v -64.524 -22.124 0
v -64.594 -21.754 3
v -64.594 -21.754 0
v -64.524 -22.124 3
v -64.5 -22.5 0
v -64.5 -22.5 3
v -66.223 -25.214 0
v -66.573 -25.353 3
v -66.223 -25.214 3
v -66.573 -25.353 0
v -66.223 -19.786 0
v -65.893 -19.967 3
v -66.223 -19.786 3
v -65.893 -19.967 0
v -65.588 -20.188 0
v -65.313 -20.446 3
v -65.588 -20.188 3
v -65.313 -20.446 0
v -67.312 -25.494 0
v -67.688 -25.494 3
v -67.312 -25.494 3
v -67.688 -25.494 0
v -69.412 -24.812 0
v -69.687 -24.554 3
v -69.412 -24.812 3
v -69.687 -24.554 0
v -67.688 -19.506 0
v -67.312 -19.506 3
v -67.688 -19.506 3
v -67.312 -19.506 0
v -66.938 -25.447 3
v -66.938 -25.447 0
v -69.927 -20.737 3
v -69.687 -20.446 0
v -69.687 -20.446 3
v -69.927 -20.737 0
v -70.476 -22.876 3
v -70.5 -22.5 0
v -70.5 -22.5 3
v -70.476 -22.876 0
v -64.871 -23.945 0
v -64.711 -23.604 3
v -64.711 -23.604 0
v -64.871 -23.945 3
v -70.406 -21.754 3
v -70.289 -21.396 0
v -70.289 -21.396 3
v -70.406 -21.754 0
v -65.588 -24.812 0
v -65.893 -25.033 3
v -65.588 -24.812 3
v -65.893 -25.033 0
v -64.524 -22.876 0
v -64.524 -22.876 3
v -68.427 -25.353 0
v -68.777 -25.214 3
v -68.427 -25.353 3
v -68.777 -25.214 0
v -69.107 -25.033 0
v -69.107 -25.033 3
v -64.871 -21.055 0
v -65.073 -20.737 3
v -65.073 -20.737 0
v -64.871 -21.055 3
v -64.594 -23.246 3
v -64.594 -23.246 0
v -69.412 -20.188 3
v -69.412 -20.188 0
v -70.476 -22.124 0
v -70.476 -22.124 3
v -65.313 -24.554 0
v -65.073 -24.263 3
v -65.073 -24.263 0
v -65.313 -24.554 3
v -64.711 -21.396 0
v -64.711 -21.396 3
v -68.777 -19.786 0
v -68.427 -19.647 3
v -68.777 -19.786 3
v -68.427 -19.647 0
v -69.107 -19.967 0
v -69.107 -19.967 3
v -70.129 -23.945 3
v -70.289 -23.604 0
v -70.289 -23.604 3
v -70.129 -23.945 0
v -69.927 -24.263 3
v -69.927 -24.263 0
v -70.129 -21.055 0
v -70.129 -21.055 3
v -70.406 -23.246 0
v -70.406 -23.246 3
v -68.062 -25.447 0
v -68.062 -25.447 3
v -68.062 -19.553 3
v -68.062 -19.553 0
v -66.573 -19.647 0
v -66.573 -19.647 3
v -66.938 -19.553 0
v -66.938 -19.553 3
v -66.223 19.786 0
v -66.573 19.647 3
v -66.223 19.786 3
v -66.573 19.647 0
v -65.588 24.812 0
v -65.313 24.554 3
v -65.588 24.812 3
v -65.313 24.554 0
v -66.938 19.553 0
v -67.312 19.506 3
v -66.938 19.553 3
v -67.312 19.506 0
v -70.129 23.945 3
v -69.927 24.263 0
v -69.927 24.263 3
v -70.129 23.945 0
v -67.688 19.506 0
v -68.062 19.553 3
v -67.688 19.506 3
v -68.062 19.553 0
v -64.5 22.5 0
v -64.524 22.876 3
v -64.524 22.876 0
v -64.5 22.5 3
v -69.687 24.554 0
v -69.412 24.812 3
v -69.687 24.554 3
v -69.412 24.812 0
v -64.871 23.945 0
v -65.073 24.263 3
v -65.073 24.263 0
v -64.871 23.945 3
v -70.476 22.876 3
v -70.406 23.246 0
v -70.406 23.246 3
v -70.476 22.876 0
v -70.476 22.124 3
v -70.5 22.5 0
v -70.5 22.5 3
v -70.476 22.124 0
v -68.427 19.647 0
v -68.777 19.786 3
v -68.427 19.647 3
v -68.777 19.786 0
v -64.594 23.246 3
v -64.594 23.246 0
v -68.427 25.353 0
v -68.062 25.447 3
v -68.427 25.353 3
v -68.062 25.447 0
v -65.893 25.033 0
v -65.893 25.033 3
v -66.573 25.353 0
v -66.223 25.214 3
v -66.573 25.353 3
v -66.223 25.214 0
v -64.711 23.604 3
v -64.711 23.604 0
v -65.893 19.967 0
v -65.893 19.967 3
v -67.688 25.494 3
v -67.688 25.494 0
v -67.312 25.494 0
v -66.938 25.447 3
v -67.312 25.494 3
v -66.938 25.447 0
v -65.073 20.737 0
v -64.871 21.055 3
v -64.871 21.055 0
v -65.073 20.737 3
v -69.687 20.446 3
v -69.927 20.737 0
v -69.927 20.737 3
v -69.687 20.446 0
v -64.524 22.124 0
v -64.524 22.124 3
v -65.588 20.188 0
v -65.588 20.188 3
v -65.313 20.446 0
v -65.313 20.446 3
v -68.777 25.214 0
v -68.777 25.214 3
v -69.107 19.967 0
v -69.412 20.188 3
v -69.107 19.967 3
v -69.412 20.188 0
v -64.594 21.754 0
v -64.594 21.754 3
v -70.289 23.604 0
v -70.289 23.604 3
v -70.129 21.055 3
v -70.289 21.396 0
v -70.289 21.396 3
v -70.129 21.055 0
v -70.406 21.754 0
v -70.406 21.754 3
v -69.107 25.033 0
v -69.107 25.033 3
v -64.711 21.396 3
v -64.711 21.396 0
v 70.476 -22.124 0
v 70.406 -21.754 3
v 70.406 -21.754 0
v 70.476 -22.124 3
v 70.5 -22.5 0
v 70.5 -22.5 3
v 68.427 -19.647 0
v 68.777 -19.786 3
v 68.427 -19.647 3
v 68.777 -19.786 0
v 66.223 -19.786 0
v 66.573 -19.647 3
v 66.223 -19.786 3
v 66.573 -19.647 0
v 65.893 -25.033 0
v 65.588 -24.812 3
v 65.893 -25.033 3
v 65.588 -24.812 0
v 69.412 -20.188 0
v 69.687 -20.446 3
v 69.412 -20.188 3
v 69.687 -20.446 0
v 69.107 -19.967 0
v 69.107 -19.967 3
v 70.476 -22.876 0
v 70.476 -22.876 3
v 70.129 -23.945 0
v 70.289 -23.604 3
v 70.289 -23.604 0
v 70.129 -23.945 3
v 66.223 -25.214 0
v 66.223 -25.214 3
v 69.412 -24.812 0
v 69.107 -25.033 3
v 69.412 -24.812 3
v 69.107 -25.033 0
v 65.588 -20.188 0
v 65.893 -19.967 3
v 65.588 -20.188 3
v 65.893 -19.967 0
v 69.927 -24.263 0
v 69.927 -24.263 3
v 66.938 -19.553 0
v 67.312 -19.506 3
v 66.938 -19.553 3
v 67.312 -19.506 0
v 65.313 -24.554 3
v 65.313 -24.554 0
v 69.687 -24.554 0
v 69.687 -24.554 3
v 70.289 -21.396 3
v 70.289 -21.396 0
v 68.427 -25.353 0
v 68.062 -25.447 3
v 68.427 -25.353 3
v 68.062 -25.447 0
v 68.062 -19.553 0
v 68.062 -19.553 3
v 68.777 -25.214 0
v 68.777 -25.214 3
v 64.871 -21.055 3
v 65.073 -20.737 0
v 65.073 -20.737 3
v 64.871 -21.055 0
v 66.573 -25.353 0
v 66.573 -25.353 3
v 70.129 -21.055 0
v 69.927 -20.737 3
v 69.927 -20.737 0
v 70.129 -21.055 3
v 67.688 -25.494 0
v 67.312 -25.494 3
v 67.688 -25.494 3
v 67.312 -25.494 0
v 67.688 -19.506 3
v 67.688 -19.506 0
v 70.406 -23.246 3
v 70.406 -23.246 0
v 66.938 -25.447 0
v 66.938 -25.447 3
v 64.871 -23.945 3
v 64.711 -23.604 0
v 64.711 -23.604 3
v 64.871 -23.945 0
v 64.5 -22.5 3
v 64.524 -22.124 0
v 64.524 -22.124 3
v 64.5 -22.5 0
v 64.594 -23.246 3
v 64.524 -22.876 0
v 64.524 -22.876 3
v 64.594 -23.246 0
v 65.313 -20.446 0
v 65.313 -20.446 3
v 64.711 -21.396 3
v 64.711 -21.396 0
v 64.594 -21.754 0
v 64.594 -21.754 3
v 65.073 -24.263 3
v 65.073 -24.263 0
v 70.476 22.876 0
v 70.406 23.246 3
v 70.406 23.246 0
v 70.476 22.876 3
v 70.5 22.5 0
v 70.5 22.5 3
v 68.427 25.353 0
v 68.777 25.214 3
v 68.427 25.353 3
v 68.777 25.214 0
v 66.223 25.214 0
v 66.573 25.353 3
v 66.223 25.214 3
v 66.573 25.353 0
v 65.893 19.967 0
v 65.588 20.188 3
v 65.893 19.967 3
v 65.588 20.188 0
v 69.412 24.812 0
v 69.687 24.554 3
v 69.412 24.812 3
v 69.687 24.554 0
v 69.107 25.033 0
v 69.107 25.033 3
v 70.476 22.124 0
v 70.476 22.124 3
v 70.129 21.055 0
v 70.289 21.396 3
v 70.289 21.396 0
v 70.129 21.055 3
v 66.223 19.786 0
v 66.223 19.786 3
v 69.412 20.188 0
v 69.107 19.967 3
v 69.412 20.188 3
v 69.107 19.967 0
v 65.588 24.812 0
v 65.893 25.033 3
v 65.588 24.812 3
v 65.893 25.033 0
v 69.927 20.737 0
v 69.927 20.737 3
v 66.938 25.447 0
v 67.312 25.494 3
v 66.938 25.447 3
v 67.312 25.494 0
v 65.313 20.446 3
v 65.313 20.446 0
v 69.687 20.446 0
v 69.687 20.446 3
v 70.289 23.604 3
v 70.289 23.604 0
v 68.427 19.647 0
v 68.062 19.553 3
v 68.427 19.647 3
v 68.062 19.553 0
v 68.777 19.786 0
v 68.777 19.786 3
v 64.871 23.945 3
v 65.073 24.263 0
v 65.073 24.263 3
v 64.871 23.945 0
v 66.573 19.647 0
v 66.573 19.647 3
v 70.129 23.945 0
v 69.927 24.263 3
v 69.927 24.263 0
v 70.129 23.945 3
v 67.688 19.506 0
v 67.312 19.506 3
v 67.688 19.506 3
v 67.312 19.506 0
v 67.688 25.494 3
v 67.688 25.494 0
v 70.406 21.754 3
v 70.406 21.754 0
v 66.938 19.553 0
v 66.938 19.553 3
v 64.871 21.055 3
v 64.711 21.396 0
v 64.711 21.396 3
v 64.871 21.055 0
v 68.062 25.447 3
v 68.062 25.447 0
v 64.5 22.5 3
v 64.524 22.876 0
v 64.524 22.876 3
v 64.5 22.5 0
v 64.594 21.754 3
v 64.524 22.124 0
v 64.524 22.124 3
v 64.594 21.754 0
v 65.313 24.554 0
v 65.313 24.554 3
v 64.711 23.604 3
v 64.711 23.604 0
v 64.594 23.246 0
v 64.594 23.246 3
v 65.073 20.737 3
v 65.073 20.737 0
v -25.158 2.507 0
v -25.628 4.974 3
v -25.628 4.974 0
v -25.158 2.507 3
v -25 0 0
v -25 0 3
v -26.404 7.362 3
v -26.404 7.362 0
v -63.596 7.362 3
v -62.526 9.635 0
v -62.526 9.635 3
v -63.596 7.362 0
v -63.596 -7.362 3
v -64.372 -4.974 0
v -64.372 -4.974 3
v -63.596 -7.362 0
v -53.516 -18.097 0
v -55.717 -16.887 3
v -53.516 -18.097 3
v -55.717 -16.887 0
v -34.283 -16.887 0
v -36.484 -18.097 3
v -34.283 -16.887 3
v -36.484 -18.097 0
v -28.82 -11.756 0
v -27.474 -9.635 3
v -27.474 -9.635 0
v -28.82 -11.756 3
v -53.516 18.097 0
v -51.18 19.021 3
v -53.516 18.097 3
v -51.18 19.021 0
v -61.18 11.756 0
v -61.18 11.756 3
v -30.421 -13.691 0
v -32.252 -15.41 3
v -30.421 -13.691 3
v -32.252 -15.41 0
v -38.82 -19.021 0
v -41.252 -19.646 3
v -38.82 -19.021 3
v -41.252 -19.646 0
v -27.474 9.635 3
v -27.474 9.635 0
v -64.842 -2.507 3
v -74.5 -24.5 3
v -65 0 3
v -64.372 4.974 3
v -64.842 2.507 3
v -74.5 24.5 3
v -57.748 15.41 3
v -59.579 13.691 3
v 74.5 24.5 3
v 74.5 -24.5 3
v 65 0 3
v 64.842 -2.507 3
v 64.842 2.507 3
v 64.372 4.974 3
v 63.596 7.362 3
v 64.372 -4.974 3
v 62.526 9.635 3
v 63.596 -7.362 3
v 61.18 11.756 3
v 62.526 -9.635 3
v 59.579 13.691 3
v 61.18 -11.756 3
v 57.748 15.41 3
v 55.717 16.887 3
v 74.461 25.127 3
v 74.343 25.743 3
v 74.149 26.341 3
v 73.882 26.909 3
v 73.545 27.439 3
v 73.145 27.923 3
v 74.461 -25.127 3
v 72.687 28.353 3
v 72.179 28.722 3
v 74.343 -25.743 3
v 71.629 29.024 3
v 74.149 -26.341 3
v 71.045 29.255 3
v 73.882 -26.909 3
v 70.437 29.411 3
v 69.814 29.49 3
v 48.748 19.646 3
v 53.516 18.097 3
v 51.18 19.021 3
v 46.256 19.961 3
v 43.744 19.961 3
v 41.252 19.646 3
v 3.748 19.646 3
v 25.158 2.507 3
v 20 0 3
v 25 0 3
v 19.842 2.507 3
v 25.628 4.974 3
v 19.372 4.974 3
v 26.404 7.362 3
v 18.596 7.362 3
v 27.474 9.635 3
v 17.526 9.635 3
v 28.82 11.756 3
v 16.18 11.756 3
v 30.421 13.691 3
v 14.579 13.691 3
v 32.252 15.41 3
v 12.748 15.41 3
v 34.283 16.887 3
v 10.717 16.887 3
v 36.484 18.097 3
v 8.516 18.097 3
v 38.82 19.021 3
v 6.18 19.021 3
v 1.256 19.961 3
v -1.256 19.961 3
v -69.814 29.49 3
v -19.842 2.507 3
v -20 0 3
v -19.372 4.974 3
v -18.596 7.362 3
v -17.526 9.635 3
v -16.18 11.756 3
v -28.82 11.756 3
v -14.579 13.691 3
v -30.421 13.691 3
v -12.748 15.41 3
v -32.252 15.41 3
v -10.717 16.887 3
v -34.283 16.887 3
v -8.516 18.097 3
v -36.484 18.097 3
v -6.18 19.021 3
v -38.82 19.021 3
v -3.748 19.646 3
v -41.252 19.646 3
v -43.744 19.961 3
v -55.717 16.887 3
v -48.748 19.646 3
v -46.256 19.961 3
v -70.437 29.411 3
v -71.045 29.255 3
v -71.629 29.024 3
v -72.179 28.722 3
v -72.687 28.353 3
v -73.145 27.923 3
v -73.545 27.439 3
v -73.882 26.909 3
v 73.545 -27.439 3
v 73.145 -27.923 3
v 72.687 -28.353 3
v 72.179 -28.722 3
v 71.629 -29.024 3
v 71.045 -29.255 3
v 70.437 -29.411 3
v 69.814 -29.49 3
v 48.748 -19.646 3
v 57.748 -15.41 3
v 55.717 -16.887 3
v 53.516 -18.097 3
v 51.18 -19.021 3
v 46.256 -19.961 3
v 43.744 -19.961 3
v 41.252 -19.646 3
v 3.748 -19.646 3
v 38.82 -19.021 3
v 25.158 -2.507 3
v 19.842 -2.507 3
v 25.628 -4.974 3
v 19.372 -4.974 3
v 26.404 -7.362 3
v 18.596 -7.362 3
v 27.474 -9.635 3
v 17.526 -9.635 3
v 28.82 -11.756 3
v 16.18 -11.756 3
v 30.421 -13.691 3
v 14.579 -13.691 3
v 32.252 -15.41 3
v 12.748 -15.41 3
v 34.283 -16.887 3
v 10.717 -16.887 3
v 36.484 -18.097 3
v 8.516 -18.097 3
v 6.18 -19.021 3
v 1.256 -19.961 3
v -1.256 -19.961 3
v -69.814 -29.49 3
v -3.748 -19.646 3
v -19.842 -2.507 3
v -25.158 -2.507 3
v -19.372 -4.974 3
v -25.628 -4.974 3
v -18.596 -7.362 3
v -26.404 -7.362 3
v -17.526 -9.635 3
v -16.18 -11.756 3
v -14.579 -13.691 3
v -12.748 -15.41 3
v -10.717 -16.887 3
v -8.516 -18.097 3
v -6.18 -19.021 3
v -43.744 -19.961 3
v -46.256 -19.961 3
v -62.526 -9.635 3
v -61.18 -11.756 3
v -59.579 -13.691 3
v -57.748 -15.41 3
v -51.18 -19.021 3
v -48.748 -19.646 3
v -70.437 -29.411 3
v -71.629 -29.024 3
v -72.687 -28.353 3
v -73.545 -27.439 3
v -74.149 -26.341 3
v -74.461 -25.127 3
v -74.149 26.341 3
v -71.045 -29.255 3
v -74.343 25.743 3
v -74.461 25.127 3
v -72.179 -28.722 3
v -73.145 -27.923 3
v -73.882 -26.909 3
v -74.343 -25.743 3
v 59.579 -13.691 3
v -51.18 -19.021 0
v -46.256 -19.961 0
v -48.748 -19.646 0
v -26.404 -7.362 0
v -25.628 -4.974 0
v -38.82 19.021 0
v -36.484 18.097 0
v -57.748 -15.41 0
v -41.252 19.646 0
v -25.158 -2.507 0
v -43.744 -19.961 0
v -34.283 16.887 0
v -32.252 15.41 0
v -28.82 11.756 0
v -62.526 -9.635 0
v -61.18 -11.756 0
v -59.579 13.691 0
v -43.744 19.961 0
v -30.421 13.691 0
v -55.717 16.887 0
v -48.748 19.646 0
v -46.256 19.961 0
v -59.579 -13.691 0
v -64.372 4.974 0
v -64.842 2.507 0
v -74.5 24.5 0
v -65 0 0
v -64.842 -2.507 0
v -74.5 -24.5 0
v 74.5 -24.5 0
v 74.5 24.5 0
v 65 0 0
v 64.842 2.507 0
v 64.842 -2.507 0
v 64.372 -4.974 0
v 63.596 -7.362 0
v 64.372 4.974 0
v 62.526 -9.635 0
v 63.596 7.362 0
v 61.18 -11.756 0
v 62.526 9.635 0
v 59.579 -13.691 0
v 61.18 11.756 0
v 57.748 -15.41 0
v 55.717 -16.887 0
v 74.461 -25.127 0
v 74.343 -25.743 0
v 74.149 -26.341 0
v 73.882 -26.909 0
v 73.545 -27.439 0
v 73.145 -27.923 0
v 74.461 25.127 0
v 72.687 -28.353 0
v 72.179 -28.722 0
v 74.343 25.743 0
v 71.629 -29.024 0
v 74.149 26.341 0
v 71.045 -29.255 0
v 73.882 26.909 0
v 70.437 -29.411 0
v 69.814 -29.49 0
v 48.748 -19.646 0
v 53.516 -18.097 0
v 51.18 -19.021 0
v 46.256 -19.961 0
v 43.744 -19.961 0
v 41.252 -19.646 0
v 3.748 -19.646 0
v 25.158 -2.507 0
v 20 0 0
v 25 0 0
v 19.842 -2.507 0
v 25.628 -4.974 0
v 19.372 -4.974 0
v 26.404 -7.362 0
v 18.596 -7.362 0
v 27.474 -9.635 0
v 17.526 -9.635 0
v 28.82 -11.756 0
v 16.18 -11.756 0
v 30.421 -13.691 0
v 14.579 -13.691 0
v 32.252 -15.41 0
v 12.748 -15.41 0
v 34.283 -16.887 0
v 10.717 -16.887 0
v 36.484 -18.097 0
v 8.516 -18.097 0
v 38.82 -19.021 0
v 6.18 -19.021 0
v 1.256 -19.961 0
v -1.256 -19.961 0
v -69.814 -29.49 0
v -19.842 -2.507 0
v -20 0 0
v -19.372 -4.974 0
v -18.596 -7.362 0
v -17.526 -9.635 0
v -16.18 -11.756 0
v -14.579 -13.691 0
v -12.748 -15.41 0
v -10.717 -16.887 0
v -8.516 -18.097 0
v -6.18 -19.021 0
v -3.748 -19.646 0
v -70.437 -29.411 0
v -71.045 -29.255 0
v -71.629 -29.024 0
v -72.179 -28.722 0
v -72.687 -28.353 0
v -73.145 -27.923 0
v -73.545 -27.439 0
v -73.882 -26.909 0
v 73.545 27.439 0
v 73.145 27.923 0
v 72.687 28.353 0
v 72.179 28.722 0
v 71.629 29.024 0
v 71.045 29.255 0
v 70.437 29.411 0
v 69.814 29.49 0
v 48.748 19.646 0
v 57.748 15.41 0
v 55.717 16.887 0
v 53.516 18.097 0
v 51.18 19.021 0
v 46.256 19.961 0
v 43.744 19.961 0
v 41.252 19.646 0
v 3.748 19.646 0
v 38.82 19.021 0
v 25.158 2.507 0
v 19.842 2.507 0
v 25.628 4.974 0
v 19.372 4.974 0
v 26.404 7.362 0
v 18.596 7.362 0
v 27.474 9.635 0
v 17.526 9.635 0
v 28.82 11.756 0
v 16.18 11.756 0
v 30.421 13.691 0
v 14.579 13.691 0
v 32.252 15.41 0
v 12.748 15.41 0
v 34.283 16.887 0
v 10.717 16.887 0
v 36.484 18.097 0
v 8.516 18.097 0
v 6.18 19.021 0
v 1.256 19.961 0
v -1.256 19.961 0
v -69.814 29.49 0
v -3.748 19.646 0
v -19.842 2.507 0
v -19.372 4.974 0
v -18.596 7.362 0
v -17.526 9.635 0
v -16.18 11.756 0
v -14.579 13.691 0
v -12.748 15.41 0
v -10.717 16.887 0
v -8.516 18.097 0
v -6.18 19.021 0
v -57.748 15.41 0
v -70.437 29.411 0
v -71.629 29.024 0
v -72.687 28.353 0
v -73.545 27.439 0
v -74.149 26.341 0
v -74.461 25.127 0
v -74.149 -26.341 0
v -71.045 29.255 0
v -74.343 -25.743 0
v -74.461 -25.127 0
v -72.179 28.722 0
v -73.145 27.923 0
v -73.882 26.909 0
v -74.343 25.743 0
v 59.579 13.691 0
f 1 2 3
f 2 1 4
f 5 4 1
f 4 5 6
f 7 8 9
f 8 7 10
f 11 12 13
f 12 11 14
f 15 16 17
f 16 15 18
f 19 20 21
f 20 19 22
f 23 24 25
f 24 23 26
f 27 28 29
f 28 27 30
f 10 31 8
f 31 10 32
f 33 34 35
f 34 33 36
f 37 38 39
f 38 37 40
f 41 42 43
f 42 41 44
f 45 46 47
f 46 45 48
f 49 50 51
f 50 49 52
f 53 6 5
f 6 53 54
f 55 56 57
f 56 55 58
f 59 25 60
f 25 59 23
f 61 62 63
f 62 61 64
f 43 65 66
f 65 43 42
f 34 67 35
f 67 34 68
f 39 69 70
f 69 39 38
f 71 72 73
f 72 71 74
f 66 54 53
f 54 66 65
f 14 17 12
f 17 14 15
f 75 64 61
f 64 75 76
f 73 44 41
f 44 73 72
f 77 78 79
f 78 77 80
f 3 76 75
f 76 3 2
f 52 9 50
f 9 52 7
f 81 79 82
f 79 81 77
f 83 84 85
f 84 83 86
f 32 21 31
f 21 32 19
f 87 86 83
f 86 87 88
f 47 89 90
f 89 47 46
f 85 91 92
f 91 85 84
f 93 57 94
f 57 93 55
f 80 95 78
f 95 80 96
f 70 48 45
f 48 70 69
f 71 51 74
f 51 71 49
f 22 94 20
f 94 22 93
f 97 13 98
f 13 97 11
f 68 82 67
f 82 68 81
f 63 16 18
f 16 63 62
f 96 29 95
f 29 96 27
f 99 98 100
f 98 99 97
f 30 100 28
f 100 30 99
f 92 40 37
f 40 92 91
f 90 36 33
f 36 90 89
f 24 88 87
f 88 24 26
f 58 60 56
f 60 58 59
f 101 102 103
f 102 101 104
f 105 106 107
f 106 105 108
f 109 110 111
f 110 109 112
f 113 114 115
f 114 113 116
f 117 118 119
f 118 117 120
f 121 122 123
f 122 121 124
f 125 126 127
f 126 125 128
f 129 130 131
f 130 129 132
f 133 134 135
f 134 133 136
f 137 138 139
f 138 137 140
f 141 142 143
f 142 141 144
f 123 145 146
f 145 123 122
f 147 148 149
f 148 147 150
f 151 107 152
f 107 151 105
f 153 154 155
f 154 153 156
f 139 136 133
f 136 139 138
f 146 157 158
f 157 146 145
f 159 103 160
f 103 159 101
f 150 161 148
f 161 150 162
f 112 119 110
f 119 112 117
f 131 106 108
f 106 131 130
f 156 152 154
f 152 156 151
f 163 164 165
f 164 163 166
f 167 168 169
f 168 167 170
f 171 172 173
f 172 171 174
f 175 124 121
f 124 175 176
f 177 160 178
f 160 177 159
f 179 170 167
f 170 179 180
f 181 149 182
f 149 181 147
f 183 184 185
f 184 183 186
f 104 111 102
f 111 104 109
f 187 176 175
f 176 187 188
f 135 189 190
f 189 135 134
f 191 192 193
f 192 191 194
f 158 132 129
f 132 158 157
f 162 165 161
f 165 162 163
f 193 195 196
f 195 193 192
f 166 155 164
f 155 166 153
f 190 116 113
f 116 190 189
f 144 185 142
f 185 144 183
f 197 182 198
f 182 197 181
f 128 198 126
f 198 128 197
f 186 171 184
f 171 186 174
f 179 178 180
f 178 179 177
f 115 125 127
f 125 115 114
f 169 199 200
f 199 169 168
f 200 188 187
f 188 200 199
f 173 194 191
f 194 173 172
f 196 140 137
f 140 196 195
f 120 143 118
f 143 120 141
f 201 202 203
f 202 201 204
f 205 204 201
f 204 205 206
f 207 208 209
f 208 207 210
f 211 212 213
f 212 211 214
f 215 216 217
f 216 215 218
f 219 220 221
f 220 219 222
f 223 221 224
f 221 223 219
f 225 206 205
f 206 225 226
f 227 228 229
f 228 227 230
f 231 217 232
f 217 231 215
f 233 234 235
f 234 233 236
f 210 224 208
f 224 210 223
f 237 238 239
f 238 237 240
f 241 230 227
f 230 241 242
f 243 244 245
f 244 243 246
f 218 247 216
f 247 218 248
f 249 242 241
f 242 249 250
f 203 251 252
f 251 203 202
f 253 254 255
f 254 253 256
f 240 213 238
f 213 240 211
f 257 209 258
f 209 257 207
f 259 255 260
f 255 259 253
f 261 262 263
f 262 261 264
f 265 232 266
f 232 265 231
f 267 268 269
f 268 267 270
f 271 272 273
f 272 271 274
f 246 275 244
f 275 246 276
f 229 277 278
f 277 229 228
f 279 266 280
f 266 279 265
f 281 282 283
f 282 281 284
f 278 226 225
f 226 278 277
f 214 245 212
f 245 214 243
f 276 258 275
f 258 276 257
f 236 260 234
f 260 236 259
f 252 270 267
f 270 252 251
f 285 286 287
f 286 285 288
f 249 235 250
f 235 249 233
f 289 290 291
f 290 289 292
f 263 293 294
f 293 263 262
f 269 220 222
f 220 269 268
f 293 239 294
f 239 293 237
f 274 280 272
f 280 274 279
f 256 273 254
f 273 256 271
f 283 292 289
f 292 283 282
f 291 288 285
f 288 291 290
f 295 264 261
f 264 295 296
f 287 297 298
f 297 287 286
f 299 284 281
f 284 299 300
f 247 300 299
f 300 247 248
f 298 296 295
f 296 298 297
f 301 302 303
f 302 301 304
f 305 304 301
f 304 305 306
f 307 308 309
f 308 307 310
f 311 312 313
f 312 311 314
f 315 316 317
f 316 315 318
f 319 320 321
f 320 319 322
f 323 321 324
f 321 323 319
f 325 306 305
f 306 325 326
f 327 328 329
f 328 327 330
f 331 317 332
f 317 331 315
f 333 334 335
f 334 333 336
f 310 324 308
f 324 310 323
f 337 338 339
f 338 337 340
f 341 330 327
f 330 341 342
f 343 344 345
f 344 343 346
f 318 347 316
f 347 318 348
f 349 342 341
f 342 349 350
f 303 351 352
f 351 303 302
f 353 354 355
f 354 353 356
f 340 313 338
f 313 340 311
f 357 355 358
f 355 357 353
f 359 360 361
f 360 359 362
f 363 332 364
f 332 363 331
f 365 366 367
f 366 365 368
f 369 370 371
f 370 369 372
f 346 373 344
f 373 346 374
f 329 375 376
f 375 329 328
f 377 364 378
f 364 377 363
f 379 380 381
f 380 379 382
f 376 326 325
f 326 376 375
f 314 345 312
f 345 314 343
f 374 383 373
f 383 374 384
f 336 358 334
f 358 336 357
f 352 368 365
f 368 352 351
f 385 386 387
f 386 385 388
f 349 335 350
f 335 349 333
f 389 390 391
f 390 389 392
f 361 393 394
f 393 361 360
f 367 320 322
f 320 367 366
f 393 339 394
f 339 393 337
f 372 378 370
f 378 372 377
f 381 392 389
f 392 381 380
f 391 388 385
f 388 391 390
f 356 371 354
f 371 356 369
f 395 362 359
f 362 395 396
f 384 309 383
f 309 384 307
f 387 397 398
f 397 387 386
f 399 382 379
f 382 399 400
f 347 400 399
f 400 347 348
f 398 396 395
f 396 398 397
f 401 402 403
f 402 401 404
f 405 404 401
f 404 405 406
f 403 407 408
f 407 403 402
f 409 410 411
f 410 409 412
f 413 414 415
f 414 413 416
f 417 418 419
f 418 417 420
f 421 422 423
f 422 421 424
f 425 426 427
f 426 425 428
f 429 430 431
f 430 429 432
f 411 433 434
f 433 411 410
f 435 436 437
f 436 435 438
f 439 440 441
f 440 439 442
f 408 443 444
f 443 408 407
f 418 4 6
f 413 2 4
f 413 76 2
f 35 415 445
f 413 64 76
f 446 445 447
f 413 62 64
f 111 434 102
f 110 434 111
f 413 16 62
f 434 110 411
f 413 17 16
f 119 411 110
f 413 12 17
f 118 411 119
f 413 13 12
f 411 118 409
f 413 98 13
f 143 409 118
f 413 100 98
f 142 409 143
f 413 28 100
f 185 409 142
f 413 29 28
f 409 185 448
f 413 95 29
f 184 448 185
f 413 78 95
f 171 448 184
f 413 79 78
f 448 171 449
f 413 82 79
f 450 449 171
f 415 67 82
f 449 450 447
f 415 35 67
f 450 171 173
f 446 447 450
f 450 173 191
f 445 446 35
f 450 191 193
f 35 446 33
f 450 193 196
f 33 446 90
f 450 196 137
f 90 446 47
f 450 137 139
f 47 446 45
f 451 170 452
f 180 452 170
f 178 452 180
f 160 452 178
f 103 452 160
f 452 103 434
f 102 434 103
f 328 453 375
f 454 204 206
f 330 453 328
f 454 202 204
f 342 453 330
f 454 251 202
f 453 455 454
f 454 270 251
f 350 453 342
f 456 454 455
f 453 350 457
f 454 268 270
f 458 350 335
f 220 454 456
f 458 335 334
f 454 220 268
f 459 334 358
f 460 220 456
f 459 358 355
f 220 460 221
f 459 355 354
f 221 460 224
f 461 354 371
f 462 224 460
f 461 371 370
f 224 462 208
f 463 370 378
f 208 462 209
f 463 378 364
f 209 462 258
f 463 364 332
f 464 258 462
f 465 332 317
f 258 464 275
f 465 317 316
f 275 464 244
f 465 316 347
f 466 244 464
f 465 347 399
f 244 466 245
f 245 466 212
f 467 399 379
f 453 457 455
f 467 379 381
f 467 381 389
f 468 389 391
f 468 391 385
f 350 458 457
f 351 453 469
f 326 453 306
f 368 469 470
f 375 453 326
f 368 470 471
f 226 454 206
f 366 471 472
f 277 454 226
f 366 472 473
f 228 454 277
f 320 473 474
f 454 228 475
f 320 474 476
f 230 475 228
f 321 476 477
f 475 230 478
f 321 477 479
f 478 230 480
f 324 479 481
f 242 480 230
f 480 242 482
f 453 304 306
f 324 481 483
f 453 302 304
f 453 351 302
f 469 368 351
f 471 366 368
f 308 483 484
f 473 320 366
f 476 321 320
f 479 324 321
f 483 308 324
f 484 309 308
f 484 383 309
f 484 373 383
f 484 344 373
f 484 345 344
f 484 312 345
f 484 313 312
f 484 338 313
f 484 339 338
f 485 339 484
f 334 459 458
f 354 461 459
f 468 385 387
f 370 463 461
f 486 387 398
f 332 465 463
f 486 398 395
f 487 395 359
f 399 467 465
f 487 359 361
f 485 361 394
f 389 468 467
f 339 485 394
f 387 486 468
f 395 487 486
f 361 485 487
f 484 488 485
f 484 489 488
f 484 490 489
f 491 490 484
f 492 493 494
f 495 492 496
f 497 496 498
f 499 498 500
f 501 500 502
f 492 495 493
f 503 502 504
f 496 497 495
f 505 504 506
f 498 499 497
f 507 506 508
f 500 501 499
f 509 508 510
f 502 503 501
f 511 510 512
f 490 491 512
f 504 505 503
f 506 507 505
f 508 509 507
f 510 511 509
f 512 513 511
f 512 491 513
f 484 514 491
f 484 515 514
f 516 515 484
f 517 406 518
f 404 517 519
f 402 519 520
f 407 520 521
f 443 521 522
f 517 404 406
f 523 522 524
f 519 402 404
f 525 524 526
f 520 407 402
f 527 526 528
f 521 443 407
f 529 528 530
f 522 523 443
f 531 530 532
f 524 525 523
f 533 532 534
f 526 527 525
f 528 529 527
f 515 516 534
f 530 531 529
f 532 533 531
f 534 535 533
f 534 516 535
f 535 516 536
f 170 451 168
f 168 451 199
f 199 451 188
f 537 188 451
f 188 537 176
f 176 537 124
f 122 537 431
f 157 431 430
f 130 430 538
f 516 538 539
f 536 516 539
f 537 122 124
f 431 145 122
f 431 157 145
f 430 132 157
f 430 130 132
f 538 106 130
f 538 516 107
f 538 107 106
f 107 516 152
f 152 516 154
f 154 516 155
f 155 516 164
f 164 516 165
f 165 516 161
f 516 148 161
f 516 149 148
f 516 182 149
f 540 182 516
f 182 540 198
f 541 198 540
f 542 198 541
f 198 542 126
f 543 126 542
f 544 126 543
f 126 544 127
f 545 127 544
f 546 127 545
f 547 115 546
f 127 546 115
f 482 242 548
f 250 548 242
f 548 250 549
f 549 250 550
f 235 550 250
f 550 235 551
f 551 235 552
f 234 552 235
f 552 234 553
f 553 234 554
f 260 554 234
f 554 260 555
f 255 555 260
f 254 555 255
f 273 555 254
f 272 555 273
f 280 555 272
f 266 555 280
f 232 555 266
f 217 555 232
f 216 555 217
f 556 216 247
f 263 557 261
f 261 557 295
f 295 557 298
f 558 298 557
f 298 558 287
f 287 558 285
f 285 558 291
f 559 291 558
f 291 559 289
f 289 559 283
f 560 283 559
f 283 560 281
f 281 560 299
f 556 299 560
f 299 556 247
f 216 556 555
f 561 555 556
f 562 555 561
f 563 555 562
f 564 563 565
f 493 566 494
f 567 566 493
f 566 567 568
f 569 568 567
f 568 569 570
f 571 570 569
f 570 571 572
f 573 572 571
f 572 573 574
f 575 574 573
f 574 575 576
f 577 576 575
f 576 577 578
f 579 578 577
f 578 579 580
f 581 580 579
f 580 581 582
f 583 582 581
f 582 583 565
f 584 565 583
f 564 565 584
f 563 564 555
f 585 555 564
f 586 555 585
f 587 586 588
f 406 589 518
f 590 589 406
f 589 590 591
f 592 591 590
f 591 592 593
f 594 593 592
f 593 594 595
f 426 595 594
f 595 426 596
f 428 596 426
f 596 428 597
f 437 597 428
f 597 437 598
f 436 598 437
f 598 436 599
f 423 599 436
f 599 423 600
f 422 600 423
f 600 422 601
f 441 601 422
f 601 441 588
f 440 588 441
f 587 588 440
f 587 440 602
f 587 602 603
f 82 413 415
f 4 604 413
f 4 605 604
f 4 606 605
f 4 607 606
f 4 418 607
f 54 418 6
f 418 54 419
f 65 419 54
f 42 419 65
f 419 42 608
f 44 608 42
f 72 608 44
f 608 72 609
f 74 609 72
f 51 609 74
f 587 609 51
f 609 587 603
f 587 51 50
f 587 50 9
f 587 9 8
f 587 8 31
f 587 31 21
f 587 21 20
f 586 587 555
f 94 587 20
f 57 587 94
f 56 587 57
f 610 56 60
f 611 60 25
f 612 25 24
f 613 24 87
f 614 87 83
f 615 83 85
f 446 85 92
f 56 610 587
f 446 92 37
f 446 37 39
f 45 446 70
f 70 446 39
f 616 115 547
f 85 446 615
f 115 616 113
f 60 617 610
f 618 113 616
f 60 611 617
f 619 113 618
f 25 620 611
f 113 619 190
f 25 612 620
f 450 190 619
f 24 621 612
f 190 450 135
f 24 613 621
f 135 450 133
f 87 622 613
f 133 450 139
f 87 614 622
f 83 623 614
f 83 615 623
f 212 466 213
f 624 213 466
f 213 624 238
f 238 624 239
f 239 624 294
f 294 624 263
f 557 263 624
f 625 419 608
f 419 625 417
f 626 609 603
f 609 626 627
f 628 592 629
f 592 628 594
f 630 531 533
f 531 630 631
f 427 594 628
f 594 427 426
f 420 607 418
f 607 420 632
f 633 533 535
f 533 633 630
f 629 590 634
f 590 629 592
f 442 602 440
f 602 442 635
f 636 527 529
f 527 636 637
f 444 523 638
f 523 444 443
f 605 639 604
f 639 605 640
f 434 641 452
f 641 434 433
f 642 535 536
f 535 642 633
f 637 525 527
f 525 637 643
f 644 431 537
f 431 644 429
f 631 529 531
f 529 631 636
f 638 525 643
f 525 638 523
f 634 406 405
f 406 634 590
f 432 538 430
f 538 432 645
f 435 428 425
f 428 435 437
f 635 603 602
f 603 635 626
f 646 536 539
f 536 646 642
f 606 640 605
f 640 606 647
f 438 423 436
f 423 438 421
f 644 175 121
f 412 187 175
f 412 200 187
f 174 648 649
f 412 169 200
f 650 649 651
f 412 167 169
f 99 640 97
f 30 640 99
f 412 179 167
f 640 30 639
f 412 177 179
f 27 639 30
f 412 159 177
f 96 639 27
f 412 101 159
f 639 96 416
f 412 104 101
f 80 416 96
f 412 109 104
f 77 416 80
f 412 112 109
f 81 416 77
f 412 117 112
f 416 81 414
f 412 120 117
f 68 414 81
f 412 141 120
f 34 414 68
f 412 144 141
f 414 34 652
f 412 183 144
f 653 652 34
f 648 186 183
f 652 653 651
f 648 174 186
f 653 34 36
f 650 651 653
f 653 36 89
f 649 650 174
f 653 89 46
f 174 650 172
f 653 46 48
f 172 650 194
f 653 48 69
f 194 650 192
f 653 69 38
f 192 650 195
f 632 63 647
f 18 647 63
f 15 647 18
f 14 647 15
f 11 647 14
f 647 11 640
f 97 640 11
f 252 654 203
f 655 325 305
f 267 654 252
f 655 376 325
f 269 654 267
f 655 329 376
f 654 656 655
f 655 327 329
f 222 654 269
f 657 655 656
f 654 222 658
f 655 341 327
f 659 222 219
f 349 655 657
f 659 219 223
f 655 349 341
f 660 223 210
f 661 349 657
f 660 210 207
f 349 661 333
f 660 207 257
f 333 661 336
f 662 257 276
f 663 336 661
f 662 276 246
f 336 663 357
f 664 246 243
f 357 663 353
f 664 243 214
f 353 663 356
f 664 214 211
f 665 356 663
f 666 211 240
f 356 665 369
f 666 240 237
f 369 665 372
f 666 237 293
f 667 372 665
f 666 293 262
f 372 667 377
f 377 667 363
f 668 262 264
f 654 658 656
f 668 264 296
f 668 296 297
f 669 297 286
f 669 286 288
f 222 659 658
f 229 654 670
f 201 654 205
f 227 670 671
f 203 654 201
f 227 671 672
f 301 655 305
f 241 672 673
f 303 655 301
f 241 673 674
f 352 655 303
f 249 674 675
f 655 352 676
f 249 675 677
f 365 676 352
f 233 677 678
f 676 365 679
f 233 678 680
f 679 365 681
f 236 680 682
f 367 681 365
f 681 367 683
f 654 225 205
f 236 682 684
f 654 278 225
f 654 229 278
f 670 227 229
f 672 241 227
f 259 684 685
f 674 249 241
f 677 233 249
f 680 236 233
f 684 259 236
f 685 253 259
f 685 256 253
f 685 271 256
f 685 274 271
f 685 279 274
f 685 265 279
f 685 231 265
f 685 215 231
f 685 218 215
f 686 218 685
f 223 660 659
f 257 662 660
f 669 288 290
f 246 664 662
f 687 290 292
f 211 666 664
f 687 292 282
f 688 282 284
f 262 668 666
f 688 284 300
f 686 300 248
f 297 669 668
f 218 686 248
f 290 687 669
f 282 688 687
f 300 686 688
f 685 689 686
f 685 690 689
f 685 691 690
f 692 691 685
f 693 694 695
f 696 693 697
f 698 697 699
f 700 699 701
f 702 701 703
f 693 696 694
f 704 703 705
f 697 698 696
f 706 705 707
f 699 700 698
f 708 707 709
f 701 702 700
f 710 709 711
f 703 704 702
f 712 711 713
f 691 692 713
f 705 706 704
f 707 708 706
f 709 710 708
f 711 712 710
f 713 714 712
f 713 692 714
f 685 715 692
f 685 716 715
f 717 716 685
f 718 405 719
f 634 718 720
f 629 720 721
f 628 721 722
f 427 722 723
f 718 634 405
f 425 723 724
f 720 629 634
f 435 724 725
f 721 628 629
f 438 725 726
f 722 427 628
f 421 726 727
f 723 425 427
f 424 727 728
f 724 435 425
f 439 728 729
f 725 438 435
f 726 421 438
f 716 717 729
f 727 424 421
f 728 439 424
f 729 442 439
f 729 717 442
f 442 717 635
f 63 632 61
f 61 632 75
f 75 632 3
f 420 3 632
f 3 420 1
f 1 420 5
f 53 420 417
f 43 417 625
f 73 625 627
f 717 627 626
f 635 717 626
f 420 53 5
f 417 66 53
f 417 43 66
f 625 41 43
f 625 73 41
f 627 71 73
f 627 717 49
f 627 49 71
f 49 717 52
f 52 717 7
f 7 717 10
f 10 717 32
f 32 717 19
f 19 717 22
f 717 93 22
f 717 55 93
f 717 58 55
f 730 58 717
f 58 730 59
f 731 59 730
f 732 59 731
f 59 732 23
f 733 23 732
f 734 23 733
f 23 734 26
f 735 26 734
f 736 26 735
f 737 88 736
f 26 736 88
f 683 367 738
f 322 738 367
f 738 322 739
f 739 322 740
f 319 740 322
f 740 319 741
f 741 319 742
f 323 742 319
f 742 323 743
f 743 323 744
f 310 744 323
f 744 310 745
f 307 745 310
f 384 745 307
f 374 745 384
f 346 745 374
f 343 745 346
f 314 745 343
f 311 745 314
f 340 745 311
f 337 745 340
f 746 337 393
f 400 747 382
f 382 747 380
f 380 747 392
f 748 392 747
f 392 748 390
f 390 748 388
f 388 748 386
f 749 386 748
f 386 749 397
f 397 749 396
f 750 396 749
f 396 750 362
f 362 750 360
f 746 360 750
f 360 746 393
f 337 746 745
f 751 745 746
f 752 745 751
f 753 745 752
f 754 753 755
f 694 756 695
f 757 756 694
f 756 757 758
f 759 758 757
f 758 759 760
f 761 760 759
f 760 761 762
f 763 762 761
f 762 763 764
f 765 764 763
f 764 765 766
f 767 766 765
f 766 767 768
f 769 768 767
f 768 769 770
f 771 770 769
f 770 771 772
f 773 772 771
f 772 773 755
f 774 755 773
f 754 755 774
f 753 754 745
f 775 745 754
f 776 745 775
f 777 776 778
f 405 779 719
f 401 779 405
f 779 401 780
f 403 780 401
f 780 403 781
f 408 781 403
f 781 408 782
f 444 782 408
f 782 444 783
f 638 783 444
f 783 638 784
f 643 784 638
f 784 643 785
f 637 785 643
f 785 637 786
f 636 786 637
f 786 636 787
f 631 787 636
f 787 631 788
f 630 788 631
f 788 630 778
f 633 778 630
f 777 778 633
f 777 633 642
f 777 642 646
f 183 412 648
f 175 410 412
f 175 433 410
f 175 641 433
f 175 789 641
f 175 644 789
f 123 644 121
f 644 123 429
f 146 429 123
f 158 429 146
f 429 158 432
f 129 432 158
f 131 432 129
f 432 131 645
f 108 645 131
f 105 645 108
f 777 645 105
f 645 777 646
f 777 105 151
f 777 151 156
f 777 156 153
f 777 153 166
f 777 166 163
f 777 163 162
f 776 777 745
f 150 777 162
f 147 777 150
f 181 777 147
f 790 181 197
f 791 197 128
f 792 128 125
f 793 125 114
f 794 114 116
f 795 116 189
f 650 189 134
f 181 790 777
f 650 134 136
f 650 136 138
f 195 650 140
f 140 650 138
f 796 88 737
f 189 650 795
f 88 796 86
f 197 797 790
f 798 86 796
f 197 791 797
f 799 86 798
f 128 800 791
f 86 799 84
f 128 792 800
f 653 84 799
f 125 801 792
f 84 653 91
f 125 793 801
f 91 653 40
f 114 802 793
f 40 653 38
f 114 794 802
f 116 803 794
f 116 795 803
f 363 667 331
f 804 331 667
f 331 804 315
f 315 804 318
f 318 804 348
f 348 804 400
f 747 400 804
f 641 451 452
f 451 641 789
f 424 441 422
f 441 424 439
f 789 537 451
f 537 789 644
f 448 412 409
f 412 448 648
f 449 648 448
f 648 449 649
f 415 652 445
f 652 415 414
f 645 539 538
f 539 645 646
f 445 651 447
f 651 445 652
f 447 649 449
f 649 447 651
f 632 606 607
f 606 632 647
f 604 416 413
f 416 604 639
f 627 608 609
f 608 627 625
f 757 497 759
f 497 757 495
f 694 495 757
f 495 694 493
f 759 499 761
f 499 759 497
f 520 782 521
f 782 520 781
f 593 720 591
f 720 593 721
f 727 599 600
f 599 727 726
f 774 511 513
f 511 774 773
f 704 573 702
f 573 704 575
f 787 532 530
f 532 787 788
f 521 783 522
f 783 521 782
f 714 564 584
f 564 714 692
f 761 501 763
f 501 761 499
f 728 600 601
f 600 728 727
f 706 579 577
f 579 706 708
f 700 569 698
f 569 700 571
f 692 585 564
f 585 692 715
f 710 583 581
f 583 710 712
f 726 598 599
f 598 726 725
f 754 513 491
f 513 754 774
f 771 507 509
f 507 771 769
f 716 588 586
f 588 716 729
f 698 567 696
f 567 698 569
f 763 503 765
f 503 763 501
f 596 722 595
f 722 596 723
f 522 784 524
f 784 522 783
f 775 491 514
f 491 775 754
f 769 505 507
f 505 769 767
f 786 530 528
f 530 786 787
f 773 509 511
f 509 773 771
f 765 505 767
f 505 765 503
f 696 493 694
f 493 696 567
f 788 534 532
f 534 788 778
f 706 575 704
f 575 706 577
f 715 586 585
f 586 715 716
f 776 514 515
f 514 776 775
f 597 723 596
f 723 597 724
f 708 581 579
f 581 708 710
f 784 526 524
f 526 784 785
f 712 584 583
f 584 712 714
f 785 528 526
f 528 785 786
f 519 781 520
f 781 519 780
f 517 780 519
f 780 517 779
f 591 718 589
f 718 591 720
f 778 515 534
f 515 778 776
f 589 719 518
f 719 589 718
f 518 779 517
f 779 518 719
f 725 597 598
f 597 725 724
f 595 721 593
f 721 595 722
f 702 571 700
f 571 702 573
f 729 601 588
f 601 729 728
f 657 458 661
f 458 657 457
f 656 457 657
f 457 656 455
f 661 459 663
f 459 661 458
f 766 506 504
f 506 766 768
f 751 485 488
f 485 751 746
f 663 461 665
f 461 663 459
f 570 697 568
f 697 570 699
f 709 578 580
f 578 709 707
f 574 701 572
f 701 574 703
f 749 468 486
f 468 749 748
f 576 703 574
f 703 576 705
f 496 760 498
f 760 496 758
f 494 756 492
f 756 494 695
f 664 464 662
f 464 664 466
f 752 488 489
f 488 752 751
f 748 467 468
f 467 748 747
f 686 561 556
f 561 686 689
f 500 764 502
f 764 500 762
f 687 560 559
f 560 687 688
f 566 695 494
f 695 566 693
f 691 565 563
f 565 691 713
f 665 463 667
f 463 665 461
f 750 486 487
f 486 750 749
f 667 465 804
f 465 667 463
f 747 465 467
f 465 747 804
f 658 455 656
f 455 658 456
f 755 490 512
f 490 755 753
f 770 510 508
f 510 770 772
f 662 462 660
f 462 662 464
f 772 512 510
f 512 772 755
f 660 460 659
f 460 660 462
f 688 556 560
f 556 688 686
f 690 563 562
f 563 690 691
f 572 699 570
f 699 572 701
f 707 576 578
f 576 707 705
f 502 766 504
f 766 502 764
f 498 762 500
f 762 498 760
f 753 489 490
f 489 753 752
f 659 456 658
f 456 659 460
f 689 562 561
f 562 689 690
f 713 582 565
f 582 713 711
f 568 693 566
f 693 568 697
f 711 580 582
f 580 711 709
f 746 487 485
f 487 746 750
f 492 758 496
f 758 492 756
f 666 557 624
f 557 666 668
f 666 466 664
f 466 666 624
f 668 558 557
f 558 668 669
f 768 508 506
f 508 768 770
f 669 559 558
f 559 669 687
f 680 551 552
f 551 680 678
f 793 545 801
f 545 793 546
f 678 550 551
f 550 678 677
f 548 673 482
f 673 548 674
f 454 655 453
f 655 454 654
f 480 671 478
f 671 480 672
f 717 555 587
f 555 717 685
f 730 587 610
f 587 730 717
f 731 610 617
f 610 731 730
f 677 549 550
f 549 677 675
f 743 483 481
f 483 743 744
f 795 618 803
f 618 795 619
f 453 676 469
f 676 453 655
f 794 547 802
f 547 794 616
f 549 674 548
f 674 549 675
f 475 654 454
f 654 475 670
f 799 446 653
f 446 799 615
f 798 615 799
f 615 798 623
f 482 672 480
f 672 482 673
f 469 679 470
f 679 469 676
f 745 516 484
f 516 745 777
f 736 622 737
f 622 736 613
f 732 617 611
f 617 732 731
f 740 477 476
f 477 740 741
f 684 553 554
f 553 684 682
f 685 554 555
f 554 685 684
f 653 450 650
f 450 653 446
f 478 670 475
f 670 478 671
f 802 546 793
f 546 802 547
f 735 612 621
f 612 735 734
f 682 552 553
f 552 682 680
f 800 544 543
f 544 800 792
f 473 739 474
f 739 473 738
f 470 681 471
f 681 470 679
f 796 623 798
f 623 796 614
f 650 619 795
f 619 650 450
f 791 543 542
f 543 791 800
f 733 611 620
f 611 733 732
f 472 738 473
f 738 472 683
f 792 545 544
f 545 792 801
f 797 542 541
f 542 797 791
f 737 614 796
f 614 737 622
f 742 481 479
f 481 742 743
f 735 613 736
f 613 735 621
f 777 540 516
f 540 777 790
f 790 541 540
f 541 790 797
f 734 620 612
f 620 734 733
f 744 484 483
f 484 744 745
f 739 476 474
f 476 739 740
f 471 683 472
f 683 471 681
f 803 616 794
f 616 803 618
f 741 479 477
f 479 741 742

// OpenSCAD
$fn = 50;


difference() {
	union() {
		hull() {
			translate(v = [-69.5000000000, 24.5000000000, 0]) {
				cylinder(h = 3, r = 5);
			}
			translate(v = [69.5000000000, 24.5000000000, 0]) {
				cylinder(h = 3, r = 5);
			}
			translate(v = [-69.5000000000, -24.5000000000, 0]) {
				cylinder(h = 3, r = 5);
			}
			translate(v = [69.5000000000, -24.5000000000, 0]) {
				cylinder(h = 3, r = 5);
			}
		}
	}
	union() {
		#translate(v = [-67.5000000000, -22.5000000000, -100.0000000000]) {
			cylinder(h = 200, r = 3.0000000000);
		}
		#translate(v = [-67.5000000000, 22.5000000000, -100.0000000000]) {
			cylinder(h = 200, r = 3.0000000000);
		}
		#translate(v = [67.5000000000, -22.5000000000, -100.0000000000]) {
			cylinder(h = 200, r = 3.0000000000);
		}
		#translate(v = [67.5000000000, 22.5000000000, -100.0000000000]) {
			cylinder(h = 200, r = 3.0000000000);
		}
		#translate(v = [-45.0000000000, 0, 0]) {
			cylinder(h = 3, r = 20.0000000000);
		}
		#cylinder(h = 3, r = 20.0000000000);
		#translate(v = [45.0000000000, 0, 0]) {
			cylinder(h = 3, r = 20.0000000000);
		}
	}
}
